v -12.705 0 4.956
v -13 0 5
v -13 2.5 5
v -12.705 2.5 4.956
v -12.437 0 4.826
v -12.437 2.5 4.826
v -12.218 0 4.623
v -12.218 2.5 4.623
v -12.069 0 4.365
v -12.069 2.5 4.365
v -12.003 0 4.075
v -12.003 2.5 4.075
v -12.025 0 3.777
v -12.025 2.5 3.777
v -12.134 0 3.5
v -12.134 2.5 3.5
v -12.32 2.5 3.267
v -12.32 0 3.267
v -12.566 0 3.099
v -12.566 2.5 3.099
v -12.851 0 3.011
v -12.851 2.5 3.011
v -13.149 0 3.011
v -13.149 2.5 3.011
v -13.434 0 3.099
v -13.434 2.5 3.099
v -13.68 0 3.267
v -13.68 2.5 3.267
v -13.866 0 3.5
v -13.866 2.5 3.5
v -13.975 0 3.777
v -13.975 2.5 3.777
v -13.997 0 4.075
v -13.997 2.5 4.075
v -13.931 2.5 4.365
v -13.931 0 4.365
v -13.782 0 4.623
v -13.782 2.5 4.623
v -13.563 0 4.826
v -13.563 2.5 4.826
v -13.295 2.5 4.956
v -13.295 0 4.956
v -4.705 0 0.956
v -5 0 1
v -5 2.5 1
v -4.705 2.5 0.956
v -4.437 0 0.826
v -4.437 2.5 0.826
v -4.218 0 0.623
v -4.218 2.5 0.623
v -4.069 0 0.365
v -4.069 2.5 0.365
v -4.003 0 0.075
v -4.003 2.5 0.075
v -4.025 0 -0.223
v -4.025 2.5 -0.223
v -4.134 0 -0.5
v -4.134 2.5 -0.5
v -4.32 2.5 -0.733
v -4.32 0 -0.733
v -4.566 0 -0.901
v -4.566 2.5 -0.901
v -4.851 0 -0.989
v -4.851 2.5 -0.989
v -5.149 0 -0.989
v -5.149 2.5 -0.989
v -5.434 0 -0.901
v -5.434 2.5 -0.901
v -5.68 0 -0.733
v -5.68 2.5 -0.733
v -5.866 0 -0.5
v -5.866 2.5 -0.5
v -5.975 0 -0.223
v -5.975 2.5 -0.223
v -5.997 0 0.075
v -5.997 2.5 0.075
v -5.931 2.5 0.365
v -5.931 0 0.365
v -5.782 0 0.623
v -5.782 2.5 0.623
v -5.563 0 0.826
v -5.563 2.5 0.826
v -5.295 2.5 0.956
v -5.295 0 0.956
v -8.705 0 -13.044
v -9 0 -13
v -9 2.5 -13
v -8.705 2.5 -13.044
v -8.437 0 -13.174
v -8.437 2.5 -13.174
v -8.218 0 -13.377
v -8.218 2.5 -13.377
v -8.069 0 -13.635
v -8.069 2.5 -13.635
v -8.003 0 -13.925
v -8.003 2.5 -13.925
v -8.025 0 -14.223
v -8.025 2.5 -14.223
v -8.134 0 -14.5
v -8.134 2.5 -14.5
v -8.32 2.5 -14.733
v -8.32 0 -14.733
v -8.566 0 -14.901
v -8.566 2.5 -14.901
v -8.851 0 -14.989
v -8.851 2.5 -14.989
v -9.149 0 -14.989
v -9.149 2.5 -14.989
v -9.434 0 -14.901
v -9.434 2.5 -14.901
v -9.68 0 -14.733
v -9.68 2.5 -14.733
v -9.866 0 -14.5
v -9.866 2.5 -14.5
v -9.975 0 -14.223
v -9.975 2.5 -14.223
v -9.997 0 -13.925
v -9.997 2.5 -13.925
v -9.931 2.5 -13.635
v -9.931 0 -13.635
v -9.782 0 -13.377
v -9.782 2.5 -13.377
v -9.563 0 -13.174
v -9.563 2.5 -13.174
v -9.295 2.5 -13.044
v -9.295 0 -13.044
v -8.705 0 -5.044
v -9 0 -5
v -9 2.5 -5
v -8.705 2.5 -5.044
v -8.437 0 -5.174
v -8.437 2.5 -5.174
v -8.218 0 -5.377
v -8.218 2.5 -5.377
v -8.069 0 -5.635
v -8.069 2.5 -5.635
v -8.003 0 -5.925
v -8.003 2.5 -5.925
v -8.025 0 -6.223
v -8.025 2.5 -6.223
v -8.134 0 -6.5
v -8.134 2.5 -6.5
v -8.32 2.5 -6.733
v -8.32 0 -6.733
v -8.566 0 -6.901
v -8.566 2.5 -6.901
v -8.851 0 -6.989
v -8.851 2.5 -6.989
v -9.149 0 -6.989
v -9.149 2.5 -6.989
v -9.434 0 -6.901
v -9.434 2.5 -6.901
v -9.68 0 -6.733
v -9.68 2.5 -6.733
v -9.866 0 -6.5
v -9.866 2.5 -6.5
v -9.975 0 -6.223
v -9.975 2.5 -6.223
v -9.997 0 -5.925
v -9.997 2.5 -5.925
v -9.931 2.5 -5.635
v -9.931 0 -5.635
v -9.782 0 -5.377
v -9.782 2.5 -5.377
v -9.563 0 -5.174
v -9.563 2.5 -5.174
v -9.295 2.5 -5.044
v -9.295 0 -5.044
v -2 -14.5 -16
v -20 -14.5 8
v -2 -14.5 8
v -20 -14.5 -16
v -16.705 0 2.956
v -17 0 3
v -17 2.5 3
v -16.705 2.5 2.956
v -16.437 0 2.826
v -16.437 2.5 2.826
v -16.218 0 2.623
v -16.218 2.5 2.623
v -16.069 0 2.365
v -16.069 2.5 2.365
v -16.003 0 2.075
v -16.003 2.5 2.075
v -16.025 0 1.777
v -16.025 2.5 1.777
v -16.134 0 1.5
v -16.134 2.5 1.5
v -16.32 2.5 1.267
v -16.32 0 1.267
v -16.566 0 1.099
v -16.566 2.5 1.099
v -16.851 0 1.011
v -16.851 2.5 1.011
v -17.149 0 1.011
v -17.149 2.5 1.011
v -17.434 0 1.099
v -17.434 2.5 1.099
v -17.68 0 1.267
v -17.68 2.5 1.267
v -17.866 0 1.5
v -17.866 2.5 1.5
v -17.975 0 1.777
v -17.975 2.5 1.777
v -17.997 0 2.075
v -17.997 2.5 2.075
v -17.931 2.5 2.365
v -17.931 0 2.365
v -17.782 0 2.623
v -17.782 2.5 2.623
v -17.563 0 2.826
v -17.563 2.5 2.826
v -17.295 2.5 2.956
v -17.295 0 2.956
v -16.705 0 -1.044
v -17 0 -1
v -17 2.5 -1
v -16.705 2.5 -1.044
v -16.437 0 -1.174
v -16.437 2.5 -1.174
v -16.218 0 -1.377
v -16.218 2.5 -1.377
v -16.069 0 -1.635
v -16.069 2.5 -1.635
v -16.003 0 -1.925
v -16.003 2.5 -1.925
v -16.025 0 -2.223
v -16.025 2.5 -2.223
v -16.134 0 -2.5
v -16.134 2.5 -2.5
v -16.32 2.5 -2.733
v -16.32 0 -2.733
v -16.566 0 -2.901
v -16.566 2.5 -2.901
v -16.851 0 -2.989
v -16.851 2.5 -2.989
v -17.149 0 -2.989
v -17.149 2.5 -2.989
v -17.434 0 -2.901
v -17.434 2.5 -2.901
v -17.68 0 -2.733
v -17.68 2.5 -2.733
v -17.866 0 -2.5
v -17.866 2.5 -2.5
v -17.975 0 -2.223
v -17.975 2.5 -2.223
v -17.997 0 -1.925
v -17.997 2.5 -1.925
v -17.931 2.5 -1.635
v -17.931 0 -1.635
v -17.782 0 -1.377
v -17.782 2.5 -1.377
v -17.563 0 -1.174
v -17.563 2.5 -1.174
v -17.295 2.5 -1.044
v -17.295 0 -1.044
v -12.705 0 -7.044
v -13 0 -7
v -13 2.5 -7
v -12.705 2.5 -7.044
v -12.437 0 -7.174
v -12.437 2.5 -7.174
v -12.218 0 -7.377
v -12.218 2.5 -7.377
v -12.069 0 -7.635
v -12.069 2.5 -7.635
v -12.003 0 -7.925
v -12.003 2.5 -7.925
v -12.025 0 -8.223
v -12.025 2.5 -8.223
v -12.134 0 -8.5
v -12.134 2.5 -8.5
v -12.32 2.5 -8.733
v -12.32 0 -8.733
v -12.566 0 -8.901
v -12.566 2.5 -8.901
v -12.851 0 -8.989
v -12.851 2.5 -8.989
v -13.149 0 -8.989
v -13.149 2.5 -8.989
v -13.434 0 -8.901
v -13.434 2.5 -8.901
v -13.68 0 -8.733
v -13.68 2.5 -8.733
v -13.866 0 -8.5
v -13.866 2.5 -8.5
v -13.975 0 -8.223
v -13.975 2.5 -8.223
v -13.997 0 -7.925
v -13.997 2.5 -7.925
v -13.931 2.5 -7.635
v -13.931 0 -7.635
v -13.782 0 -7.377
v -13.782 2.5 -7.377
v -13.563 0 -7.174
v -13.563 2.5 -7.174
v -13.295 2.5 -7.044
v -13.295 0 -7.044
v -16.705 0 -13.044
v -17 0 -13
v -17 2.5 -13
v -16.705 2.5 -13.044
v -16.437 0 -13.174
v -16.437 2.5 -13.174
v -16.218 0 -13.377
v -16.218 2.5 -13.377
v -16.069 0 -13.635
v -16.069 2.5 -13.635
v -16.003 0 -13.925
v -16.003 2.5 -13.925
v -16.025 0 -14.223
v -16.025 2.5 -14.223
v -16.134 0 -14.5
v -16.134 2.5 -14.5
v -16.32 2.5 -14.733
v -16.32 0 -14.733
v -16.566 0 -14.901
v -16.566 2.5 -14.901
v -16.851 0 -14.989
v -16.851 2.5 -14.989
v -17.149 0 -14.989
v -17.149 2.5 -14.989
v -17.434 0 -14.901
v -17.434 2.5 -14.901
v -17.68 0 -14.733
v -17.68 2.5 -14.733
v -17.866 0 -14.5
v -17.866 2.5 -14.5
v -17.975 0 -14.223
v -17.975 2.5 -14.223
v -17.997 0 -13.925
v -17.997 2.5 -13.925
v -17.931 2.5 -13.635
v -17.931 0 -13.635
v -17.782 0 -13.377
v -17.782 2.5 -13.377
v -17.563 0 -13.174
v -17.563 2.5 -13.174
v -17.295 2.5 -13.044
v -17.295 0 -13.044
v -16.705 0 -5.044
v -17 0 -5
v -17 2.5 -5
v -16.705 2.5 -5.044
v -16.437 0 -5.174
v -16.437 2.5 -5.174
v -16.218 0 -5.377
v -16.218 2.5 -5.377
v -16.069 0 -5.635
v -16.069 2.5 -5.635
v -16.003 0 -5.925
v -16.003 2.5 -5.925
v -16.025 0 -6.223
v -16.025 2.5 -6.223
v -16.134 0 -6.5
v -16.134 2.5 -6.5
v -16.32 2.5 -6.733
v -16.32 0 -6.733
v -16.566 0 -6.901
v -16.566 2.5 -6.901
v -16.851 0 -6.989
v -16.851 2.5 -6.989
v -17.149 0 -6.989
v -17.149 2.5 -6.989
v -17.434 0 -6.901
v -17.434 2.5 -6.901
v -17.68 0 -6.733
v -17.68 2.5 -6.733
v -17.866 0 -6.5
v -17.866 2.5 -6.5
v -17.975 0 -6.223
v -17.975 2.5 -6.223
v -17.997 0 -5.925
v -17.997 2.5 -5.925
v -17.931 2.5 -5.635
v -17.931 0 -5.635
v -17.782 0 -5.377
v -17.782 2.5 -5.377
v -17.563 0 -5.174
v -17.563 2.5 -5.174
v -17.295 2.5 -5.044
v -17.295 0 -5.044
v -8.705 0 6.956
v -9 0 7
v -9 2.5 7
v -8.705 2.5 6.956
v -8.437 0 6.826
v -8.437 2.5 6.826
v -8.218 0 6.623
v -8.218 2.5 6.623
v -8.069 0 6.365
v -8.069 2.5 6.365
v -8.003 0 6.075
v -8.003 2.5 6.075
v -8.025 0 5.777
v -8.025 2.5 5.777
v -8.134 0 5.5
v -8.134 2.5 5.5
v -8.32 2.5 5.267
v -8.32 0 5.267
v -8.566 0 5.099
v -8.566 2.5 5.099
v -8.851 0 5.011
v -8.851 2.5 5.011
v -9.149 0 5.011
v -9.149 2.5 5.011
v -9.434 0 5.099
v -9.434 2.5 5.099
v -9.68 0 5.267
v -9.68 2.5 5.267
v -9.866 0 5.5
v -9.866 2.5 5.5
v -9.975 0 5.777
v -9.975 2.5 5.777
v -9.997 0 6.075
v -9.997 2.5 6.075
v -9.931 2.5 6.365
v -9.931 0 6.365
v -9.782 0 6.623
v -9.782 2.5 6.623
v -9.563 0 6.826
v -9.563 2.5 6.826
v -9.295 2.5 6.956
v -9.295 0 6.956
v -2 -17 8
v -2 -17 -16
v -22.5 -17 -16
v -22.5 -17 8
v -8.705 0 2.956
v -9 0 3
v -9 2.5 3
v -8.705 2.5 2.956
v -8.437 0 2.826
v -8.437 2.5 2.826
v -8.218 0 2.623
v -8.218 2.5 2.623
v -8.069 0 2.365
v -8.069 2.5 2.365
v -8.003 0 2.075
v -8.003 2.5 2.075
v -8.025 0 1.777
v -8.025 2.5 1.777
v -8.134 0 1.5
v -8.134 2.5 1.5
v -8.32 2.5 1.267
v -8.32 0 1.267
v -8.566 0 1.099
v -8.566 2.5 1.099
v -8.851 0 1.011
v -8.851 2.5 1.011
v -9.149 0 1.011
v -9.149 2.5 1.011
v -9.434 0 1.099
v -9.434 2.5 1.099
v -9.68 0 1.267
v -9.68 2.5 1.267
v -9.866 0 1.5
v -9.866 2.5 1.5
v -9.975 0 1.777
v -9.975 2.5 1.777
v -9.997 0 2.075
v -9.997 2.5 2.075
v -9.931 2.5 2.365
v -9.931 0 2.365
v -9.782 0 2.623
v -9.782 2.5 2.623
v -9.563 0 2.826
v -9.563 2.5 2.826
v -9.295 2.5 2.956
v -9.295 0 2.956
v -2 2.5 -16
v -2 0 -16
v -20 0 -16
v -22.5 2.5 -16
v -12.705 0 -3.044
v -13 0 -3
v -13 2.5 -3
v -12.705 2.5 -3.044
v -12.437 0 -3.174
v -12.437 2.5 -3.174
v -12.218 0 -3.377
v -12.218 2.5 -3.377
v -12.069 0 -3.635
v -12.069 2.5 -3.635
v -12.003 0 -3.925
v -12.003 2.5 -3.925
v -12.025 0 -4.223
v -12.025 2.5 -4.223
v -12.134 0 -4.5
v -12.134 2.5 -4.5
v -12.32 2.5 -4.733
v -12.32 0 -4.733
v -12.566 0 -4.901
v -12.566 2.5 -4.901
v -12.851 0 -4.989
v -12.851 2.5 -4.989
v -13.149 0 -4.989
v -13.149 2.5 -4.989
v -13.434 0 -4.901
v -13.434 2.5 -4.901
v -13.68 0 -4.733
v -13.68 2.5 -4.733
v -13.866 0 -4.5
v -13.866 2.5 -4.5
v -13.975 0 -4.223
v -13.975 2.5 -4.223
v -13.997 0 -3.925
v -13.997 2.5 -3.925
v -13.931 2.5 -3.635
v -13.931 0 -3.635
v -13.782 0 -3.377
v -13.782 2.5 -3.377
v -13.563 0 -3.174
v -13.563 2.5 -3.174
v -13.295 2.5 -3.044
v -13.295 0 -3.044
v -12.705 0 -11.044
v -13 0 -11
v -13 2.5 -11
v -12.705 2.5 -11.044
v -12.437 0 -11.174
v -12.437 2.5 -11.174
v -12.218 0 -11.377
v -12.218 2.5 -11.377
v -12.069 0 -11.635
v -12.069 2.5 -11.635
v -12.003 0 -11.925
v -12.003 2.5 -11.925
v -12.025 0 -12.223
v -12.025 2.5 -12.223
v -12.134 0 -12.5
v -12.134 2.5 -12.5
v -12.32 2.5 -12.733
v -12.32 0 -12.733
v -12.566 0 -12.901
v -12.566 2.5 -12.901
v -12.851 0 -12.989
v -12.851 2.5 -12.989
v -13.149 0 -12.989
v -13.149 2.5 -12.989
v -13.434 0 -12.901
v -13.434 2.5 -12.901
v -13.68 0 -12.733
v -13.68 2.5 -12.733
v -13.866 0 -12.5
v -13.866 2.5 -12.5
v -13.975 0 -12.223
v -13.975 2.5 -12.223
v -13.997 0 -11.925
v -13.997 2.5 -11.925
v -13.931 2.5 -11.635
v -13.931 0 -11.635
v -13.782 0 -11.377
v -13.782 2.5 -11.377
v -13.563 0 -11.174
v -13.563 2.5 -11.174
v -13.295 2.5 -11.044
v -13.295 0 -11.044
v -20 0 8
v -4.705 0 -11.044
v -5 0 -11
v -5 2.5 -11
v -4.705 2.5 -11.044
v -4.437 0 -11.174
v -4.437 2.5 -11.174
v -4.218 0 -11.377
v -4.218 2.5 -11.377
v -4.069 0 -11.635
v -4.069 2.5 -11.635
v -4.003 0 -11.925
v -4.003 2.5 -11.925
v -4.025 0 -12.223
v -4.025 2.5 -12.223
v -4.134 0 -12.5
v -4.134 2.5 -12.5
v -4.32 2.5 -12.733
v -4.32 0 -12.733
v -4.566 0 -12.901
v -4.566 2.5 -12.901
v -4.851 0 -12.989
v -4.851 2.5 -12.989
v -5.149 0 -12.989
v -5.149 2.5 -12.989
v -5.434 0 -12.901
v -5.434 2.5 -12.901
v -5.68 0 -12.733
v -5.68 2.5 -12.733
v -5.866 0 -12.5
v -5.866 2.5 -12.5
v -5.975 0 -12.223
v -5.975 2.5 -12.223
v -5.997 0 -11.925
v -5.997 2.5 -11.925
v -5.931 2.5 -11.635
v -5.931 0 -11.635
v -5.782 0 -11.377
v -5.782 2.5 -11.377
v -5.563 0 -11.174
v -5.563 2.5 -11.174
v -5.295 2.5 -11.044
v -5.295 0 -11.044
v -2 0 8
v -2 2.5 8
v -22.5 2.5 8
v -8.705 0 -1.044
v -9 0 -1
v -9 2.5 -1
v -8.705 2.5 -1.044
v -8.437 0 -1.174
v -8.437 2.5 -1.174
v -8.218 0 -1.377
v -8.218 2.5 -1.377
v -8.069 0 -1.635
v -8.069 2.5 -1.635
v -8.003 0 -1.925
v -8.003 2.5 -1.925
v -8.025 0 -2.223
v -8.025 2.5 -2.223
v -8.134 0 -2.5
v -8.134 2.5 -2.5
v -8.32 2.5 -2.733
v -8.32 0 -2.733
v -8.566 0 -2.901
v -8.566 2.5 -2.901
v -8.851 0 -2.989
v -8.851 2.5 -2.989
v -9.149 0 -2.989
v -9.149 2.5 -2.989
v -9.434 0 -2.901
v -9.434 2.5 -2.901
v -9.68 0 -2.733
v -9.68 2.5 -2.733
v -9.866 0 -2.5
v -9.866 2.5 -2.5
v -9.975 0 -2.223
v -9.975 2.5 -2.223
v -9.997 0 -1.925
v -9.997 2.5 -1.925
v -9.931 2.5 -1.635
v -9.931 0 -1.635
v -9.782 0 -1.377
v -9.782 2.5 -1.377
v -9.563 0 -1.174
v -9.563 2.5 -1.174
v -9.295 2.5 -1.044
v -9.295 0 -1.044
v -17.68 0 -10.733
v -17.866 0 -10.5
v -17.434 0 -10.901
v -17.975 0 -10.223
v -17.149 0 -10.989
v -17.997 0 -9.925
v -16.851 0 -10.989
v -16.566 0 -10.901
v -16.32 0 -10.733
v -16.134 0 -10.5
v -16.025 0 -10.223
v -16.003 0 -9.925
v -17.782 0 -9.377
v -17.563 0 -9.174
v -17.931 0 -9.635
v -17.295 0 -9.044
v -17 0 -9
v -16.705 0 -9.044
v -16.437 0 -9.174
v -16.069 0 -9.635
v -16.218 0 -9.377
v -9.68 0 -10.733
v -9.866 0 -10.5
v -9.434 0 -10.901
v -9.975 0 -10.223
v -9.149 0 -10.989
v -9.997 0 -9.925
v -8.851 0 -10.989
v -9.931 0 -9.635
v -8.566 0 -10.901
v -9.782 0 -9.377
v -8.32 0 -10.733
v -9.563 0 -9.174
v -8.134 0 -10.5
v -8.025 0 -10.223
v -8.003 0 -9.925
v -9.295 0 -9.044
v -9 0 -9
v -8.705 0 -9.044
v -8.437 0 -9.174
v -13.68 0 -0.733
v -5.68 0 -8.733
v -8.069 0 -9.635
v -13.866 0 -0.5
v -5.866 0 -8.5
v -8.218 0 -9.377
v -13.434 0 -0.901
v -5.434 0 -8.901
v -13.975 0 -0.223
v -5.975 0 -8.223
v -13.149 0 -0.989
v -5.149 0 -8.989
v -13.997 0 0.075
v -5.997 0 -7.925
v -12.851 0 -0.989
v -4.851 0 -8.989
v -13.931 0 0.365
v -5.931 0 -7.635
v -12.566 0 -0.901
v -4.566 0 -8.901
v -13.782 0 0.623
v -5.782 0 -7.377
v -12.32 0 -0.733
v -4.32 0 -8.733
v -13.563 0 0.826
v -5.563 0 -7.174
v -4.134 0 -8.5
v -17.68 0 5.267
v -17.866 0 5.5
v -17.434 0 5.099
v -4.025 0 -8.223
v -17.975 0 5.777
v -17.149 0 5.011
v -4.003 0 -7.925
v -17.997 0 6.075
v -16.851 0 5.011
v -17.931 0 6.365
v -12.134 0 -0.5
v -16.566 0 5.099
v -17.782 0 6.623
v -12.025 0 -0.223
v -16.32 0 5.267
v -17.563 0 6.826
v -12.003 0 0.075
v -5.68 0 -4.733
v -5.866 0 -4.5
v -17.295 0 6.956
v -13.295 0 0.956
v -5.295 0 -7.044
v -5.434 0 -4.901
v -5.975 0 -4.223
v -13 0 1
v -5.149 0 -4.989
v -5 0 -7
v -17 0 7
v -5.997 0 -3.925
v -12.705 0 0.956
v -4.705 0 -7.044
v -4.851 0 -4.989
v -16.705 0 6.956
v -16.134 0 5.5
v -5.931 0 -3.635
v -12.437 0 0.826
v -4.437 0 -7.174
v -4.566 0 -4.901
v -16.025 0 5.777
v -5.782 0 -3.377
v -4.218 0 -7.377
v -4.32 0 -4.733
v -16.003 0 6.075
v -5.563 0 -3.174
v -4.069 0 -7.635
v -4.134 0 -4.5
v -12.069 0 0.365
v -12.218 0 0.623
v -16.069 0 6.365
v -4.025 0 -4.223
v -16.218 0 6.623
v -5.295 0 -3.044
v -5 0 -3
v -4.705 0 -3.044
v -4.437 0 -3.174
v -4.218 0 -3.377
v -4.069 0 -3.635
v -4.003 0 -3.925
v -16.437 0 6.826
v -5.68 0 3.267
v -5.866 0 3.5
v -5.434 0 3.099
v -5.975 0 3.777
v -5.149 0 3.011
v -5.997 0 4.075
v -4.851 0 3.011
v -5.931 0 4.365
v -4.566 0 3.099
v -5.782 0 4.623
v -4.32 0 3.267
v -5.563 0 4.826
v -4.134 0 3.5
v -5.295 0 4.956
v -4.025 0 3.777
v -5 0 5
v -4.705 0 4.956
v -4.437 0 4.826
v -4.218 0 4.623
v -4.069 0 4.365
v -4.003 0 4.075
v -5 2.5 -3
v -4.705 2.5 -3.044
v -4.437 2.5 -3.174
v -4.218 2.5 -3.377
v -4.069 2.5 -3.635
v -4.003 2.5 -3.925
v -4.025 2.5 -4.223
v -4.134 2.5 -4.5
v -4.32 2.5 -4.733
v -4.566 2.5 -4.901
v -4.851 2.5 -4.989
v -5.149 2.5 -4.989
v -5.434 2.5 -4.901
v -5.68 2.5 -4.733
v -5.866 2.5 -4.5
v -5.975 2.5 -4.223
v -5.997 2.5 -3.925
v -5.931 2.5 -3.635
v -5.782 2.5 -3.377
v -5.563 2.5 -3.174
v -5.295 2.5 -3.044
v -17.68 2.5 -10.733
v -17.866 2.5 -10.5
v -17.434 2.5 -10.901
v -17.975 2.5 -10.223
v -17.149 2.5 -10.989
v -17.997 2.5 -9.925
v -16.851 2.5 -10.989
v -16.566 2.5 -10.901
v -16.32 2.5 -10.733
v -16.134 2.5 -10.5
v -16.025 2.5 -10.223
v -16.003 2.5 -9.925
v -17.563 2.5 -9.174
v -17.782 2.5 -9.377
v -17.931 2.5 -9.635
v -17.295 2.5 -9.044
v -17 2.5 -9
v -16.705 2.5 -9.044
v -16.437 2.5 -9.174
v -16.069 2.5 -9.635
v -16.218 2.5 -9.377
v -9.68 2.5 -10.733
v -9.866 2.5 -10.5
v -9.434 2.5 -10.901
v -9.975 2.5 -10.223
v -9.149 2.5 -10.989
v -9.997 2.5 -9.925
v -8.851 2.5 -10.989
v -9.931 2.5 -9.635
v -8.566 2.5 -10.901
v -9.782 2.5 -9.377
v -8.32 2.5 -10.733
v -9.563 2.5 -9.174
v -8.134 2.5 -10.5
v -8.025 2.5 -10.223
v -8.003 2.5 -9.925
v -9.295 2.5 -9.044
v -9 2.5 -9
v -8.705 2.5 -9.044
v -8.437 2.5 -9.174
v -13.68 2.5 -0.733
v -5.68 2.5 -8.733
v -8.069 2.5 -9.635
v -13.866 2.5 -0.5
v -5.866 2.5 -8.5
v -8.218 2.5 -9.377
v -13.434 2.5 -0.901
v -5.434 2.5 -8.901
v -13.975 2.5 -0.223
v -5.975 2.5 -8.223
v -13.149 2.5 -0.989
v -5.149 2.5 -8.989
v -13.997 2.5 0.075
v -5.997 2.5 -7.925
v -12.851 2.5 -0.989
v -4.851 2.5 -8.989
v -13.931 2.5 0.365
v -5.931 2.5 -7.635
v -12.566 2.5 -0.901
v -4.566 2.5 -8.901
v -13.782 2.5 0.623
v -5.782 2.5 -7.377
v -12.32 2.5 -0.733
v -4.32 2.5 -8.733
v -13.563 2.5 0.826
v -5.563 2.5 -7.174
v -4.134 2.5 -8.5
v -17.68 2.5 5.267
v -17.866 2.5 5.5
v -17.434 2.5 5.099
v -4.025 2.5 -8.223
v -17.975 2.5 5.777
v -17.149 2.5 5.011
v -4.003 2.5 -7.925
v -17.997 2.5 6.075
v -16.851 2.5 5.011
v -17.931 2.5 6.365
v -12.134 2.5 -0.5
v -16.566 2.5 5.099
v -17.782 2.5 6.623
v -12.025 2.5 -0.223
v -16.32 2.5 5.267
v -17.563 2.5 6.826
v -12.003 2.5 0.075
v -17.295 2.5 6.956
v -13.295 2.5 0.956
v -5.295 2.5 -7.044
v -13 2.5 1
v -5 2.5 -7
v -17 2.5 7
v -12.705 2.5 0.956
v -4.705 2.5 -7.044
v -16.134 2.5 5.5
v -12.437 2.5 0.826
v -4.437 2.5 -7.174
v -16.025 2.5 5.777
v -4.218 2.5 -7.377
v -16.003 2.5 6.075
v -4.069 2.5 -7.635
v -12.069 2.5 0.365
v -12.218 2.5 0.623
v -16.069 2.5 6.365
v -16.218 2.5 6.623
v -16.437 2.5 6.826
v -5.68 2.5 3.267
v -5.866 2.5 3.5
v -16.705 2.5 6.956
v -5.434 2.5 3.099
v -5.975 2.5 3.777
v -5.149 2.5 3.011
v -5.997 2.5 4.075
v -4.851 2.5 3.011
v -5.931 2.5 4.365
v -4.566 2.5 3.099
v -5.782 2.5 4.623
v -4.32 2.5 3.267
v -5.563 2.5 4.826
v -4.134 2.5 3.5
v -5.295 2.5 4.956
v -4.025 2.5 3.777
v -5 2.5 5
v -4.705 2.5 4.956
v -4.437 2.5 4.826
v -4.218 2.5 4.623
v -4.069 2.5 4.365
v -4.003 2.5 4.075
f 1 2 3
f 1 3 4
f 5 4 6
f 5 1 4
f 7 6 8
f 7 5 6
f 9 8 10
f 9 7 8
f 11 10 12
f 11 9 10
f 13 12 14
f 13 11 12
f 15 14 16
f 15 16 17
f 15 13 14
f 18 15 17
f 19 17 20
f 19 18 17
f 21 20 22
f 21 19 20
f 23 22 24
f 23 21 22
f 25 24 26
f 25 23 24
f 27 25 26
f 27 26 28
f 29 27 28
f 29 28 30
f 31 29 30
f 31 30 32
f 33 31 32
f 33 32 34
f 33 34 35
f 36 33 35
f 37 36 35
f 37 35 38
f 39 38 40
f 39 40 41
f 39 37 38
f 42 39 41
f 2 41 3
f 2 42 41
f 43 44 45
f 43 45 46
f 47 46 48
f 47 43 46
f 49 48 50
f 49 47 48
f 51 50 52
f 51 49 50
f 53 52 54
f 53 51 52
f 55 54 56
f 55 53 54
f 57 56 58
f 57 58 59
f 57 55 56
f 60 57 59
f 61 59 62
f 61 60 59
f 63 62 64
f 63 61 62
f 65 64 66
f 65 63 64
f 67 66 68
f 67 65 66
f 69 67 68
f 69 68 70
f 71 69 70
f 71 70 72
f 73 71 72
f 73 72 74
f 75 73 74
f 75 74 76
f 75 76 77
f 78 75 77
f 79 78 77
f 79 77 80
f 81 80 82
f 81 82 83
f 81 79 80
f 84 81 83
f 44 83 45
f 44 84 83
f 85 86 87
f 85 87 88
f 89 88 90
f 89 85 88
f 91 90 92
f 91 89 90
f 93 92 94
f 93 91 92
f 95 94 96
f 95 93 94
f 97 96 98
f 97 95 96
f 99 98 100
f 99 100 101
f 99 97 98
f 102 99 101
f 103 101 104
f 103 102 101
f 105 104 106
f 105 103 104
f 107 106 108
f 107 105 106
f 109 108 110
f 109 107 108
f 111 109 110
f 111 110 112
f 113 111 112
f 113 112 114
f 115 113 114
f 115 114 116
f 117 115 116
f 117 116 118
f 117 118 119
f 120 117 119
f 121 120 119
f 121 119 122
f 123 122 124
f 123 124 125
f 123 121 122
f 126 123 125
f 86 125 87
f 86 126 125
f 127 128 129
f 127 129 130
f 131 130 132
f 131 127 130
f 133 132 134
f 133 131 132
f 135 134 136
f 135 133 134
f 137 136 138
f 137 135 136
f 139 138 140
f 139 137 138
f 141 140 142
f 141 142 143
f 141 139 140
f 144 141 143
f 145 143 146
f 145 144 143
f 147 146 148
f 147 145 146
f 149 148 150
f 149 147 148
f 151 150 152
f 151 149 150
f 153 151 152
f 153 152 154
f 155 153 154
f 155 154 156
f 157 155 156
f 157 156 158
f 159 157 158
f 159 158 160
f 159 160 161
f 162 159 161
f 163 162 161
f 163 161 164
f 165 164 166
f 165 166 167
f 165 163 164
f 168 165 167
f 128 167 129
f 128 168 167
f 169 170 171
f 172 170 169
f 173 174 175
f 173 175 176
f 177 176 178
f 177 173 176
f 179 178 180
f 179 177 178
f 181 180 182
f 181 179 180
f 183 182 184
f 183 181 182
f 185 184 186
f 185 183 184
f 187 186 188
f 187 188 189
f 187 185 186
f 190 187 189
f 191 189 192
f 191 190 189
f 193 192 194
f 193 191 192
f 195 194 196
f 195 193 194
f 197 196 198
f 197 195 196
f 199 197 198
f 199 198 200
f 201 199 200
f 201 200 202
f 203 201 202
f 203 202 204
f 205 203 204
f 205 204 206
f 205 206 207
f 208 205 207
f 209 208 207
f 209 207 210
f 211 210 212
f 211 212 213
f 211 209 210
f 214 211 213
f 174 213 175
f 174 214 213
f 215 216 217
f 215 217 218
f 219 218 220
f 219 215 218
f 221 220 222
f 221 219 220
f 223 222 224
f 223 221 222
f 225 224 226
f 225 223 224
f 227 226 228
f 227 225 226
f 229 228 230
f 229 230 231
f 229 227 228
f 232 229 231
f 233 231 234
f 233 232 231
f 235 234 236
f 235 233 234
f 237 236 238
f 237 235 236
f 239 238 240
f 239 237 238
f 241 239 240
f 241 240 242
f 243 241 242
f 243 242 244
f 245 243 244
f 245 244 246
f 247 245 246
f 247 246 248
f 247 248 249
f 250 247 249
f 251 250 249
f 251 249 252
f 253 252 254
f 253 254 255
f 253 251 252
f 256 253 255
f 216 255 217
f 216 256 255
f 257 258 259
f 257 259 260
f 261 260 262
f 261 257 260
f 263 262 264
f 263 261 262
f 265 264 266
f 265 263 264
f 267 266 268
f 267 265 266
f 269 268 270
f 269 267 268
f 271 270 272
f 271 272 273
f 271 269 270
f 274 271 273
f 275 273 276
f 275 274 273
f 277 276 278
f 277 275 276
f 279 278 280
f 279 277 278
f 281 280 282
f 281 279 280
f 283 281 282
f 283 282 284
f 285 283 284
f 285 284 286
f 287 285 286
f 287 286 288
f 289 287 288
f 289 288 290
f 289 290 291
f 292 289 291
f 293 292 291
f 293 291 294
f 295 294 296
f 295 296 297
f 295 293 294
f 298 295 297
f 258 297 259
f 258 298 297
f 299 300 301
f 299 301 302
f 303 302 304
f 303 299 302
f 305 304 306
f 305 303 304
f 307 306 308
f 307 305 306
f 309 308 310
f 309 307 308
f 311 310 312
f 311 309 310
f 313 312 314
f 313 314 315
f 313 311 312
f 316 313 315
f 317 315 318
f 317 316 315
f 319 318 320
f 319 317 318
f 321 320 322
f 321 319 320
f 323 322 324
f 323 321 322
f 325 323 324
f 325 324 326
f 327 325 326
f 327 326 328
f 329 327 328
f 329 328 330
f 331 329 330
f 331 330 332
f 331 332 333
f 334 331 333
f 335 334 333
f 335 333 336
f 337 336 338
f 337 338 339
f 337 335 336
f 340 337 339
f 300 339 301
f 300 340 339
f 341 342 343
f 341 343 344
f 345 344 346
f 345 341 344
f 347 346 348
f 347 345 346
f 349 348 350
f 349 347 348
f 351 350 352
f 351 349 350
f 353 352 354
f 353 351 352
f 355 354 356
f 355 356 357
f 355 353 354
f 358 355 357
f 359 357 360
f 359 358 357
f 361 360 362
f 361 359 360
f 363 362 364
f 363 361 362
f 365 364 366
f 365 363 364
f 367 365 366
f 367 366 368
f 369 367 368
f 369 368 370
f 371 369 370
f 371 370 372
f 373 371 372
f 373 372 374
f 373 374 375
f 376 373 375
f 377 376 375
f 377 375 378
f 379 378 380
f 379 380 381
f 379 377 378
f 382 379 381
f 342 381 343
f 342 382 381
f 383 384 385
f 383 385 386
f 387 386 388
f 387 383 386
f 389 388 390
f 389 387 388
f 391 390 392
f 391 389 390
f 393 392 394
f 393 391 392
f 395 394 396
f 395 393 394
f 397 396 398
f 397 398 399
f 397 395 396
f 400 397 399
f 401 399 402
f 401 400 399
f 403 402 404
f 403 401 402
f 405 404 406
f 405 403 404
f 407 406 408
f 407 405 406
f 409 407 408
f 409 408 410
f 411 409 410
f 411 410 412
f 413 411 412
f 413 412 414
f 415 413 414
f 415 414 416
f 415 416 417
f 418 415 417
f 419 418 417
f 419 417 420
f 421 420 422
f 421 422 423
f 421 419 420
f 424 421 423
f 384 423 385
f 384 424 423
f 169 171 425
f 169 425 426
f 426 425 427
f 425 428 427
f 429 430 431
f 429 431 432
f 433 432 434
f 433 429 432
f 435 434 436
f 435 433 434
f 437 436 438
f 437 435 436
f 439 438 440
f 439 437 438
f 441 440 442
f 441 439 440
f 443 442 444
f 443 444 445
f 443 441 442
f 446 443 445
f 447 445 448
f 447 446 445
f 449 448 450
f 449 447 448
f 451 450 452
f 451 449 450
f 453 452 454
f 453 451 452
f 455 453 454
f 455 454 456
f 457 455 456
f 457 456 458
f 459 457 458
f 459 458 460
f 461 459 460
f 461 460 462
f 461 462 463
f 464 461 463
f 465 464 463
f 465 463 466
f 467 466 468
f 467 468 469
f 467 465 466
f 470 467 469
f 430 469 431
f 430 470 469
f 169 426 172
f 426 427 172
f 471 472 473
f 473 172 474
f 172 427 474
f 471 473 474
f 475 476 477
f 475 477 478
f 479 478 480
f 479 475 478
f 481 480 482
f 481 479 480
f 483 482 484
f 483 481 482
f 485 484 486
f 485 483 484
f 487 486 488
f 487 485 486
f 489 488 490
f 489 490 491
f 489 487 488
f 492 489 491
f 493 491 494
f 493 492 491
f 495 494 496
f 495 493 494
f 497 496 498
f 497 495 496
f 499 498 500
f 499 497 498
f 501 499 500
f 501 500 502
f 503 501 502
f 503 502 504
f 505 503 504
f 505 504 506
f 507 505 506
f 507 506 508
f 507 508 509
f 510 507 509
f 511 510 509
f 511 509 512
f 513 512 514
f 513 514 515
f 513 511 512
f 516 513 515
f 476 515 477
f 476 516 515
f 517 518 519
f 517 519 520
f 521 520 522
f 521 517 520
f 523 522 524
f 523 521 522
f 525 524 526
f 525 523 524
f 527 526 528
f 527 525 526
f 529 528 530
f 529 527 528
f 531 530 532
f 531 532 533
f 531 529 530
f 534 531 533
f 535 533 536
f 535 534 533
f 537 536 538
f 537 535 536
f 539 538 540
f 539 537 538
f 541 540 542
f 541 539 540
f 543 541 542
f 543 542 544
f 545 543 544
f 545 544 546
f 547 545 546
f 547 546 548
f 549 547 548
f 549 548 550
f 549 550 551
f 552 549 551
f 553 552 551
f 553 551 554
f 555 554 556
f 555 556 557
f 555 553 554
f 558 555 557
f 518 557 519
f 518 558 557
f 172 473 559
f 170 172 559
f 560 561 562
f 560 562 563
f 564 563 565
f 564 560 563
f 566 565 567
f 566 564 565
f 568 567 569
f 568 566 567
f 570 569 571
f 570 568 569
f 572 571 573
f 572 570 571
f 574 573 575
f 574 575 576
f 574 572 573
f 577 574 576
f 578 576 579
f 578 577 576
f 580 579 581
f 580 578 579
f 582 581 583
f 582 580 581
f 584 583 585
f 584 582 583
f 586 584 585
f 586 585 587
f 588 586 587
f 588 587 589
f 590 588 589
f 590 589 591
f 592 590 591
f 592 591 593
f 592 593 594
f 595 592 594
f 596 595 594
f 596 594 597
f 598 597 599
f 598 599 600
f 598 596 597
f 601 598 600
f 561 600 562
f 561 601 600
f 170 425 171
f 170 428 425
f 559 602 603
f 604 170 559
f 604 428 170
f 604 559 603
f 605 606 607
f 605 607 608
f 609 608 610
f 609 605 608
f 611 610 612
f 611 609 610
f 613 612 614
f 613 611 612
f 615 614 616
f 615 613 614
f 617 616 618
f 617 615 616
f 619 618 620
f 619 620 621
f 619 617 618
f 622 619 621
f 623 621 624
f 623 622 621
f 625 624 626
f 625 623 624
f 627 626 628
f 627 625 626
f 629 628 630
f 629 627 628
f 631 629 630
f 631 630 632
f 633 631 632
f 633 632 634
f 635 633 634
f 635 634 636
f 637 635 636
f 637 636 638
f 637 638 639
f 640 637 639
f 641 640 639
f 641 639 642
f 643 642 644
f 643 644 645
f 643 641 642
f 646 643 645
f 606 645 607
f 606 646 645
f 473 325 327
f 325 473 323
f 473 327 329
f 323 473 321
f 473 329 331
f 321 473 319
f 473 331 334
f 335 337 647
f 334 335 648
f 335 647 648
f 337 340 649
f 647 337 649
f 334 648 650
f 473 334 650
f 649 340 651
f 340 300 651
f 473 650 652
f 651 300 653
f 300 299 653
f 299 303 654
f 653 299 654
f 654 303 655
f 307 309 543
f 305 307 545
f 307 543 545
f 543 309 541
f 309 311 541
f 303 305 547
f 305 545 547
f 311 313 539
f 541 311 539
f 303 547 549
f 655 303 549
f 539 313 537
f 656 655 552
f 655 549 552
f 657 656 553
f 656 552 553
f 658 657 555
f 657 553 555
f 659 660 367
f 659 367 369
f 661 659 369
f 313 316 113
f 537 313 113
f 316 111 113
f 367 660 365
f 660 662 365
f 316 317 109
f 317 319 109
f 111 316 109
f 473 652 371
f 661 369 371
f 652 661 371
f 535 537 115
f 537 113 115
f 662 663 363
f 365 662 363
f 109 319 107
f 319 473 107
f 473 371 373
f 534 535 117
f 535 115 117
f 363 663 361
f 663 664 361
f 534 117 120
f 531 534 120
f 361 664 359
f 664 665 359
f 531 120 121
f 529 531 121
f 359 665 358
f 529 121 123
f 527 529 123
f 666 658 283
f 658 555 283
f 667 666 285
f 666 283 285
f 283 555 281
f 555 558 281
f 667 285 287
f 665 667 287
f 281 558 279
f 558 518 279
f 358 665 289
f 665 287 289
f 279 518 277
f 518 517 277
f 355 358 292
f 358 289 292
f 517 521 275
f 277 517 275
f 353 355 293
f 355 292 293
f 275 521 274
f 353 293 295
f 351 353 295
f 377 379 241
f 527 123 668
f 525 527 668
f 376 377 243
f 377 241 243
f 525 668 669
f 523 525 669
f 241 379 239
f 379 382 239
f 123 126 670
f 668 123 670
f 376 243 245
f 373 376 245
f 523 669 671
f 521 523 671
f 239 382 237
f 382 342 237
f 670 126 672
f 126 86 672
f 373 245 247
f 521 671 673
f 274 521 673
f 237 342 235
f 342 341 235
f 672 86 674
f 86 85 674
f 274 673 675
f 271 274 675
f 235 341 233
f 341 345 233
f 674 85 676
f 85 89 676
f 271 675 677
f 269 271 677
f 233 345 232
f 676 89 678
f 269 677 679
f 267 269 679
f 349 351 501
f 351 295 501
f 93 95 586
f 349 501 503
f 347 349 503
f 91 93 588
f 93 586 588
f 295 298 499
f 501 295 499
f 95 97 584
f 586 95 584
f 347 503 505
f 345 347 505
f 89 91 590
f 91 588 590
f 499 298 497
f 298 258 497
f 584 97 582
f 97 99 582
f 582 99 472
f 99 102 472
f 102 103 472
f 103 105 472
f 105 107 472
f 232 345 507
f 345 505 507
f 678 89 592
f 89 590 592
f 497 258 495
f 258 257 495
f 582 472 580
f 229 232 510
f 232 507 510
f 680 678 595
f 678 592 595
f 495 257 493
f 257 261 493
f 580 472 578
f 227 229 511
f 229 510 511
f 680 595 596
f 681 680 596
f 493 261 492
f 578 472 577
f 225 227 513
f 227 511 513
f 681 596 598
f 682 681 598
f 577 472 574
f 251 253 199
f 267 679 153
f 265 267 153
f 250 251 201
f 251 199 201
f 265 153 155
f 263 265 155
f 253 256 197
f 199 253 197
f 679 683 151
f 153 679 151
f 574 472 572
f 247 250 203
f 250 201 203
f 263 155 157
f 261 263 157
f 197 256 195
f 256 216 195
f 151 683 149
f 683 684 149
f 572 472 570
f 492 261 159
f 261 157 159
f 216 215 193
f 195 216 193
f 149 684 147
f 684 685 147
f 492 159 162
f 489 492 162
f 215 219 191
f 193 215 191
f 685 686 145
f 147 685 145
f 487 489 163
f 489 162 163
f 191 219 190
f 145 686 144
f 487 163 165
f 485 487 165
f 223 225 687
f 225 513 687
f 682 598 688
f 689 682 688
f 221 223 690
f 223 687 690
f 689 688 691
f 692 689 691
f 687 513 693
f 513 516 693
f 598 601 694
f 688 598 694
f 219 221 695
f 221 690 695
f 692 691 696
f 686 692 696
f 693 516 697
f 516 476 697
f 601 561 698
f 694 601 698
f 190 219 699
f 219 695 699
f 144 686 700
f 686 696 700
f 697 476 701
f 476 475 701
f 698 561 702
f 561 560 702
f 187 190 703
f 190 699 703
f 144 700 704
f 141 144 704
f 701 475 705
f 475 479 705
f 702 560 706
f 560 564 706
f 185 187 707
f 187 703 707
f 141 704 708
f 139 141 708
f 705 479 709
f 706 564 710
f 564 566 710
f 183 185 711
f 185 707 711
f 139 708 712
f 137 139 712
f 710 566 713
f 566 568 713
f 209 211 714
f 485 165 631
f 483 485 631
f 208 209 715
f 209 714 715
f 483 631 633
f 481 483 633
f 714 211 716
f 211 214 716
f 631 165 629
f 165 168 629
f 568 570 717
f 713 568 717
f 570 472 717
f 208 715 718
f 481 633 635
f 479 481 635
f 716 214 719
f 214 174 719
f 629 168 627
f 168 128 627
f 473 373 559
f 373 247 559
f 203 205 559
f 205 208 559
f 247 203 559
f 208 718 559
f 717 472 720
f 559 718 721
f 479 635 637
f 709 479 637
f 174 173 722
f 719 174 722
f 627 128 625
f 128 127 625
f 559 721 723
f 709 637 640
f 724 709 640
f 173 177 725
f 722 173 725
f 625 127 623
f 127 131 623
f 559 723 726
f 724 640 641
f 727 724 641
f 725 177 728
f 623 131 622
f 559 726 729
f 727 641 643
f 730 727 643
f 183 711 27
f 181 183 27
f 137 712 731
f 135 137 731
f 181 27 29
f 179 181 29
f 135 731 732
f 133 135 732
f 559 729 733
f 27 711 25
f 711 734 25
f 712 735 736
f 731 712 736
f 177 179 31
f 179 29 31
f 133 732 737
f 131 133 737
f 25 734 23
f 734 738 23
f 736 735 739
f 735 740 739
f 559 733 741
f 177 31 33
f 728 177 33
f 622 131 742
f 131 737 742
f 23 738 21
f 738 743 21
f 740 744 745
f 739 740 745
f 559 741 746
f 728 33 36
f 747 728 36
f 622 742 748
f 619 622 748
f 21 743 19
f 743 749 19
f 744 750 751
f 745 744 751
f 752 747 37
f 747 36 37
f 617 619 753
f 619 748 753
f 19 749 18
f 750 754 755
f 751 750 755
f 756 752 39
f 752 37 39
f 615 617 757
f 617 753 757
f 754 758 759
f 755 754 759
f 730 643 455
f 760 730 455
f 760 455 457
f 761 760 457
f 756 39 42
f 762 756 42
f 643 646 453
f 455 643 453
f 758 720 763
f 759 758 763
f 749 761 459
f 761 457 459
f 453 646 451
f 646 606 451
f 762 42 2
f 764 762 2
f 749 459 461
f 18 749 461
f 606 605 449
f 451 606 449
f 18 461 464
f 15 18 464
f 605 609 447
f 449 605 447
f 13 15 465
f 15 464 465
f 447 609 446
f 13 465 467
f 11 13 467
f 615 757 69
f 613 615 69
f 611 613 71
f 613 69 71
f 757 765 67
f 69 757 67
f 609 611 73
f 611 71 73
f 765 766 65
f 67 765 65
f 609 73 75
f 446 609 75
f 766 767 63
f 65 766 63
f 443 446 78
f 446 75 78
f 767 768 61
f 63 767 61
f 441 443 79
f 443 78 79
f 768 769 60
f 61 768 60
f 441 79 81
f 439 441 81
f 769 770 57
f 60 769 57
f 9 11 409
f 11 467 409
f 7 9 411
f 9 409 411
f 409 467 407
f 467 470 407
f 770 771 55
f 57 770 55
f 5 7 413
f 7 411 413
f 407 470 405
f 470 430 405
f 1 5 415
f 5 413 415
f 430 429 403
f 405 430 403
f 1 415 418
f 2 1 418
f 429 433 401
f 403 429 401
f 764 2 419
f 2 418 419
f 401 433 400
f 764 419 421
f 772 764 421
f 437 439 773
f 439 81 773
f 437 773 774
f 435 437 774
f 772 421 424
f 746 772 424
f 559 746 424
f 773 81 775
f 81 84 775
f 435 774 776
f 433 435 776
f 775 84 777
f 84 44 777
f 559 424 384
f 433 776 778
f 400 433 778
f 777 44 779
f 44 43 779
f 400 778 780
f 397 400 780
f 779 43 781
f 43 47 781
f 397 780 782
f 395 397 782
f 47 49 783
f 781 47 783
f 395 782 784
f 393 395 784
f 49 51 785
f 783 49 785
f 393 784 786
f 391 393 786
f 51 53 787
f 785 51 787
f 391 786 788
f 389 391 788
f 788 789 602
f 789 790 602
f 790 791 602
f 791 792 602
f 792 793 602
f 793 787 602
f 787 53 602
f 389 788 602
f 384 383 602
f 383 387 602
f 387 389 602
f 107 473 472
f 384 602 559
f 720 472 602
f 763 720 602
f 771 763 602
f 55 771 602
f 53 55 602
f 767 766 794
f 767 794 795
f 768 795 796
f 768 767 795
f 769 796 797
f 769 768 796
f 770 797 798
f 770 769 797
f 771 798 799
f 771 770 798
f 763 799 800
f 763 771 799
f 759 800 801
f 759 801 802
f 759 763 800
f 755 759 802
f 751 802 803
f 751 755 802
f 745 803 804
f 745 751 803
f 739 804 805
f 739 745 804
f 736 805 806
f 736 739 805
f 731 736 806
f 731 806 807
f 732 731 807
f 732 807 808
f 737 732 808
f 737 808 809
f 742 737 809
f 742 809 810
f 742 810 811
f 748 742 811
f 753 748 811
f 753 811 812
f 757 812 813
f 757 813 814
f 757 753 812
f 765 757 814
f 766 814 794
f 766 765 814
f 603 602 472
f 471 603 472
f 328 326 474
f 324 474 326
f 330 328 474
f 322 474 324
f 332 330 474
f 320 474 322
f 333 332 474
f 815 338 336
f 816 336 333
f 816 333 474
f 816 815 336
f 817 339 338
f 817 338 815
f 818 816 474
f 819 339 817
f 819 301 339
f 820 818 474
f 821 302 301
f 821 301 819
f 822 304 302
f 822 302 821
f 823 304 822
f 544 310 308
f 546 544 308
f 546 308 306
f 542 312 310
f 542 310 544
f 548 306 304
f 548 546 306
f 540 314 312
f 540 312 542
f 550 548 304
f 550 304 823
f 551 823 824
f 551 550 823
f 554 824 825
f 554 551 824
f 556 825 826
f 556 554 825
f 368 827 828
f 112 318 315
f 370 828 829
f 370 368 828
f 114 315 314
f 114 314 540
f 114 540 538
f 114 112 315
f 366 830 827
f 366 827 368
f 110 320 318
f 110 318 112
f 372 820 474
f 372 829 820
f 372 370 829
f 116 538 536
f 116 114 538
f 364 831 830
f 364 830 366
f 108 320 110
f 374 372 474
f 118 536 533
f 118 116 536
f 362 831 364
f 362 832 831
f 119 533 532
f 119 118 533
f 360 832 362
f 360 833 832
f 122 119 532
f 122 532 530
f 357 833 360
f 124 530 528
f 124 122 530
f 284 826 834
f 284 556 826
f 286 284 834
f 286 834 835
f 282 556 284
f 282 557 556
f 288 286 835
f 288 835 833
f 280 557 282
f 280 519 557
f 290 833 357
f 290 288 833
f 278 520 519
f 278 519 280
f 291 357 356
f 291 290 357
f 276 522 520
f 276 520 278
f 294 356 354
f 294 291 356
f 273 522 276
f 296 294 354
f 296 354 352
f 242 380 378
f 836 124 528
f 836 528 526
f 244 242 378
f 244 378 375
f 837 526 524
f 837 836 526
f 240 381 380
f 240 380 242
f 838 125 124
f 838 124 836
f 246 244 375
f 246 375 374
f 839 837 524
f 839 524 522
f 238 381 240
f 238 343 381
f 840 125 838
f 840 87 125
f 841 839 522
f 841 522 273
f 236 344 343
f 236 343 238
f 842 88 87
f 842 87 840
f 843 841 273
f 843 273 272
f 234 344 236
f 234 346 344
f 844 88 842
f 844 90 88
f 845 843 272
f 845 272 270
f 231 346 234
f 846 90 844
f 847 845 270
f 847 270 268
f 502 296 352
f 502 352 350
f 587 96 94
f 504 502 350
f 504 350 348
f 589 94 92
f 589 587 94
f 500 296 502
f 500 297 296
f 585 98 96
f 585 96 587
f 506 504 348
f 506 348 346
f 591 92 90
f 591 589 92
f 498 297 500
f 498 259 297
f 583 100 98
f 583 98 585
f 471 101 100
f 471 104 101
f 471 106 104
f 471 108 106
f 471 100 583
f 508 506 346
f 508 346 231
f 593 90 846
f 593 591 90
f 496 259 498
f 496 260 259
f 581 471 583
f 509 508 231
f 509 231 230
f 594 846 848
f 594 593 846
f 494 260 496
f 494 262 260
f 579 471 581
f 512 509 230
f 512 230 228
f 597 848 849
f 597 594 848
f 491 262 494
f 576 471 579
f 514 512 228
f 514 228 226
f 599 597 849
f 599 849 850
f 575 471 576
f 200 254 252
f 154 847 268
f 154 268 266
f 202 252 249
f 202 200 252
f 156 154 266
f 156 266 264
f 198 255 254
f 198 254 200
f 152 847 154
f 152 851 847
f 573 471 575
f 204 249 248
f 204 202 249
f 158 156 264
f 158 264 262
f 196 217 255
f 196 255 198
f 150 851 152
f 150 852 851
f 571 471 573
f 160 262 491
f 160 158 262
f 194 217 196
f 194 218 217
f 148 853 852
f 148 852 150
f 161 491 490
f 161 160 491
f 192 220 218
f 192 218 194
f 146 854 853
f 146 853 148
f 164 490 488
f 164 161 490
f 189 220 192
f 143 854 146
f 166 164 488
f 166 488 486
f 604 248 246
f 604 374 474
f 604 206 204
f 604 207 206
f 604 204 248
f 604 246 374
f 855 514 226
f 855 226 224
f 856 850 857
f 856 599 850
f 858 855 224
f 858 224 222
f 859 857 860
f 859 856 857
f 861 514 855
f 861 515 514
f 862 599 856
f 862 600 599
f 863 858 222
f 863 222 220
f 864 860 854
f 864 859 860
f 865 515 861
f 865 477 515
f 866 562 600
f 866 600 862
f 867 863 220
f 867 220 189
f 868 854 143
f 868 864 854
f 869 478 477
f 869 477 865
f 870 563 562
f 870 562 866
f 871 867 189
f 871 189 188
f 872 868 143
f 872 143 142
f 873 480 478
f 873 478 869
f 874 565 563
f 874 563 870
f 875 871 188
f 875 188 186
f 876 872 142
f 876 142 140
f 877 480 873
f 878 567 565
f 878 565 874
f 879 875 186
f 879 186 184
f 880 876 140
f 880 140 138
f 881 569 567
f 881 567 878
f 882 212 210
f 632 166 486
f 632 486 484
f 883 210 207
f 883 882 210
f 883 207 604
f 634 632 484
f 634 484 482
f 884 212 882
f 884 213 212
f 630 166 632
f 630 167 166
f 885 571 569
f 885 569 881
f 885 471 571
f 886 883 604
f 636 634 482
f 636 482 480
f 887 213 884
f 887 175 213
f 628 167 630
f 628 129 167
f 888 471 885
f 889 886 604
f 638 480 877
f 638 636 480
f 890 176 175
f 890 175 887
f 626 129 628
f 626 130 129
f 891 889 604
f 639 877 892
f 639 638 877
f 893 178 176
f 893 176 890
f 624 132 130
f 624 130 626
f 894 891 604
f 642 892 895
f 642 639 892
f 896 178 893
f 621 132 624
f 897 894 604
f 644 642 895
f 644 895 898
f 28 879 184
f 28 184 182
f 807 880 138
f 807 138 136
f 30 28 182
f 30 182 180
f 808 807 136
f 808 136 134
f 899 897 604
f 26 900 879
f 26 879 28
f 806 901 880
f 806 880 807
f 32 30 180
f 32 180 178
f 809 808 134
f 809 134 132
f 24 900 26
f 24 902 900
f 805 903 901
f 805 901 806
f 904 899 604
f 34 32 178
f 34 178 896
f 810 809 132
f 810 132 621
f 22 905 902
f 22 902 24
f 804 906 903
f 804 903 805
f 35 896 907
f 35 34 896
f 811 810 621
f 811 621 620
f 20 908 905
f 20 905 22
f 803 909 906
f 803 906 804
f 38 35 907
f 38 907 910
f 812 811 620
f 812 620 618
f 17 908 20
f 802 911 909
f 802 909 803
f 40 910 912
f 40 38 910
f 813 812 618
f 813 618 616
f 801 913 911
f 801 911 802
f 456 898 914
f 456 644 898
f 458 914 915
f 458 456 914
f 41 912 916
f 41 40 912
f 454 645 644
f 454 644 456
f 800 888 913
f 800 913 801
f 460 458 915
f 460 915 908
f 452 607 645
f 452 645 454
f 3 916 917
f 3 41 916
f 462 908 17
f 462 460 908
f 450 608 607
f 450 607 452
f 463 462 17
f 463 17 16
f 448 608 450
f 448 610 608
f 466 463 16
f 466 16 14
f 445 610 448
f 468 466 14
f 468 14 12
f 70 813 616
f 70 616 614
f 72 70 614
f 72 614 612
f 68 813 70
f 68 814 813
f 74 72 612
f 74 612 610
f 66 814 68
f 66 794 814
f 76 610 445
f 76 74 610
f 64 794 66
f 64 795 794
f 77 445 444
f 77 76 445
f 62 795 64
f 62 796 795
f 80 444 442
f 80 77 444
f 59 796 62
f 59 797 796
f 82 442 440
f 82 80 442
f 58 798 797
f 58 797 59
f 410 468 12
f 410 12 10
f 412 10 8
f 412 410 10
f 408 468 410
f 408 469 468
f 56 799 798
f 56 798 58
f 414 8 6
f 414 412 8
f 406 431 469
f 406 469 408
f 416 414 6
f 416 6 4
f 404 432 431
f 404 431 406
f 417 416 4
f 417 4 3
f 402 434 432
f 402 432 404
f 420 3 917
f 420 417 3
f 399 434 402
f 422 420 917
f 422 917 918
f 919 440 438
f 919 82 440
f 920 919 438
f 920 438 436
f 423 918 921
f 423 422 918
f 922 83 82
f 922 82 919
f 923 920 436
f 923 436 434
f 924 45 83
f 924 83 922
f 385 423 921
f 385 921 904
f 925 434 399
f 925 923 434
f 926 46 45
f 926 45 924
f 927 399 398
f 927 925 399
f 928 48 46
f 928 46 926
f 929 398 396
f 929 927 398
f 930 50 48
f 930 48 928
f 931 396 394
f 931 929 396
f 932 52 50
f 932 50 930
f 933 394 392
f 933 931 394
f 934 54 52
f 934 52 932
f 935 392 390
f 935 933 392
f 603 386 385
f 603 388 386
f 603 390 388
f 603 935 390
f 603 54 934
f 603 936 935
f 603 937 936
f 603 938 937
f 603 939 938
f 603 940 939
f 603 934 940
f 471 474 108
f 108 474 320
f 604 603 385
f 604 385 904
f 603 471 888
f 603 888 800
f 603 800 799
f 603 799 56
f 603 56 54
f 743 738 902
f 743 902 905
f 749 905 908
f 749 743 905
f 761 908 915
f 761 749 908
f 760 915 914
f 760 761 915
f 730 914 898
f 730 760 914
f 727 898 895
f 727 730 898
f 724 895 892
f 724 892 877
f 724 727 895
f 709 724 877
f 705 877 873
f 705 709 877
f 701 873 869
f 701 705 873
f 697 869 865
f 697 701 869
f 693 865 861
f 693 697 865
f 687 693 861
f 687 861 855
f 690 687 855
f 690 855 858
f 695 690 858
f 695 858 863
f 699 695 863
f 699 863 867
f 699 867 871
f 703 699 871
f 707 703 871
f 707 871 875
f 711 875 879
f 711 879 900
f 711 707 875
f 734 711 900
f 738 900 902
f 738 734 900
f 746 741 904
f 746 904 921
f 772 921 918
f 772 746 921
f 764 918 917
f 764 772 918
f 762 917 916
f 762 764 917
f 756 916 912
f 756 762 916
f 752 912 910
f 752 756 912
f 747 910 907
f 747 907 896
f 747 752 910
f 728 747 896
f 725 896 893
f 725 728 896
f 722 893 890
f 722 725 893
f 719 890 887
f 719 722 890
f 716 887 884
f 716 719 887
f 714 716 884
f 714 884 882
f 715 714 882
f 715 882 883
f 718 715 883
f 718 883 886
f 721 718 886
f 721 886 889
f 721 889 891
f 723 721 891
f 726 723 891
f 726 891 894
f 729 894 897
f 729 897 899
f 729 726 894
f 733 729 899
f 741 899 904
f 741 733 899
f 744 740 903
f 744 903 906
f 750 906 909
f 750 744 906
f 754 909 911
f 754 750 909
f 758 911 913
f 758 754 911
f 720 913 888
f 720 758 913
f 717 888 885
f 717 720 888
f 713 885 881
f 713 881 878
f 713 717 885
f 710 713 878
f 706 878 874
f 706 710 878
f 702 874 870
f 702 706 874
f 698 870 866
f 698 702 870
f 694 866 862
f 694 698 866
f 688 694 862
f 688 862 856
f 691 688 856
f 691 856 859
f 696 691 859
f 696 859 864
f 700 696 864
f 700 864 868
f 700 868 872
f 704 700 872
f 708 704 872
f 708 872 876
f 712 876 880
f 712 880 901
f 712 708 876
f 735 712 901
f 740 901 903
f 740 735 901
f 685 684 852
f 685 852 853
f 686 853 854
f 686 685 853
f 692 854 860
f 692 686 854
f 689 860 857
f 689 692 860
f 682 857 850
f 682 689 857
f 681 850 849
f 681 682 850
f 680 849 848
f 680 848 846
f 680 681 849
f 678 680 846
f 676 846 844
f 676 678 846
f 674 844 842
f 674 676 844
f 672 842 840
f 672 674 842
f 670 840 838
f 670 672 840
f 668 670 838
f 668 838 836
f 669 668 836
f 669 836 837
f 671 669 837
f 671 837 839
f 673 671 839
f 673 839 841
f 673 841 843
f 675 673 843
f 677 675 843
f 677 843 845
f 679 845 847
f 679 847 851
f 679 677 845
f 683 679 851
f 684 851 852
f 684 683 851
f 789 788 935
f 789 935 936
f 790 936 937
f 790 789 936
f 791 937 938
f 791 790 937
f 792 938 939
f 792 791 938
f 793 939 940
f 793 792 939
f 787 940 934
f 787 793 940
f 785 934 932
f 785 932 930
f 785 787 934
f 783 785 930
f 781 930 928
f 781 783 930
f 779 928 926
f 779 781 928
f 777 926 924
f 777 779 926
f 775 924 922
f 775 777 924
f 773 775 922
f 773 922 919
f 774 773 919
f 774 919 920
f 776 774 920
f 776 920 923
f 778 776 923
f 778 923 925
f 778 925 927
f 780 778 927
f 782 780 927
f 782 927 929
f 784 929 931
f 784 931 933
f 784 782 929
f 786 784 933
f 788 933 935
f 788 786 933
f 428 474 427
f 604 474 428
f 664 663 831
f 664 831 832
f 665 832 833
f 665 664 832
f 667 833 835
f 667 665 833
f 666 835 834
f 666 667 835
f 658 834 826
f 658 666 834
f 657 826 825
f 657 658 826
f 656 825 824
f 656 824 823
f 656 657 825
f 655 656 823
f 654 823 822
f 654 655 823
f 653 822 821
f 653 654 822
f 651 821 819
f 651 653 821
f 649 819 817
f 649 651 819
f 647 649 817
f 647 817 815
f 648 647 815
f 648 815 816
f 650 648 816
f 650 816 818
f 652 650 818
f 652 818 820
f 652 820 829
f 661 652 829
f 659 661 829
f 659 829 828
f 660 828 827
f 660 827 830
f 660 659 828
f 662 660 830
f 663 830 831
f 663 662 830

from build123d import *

# Parameters (mm, degrees)
SKETCH2_W           = 18
SKETCH2_H           = 24
SKETCH2_R           = 1
BOSS_EXTRUDE2_DEPTH = 2.5
SKETCH4_W           = 24
SKETCH4_H           = 2.5
BOSS_EXTRUDE3_DEPTH = 2.5
SKETCH6_W           = 2.5
SKETCH6_H           = 24
BOSS_EXTRUDE5_DEPTH = 17
SKETCH7_W           = 24
SKETCH7_H           = 2.5
BOSS_EXTRUDE6_DEPTH = 18


with BuildPart() as part:
    # Sketch2 → Boss-Extrude2 (new body)
    with BuildSketch(Plane(origin=(0, 0, 0), x_dir=(1, 0, 0), z_dir=(0, 1, 0))):
        with Locations((-11, 4)):
            Rectangle(SKETCH2_W, SKETCH2_H)
        with Locations(Location((-17, -6, 0), (0, 0, 270))):
            Circle(SKETCH2_R, mode=Mode.SUBTRACT)
        with Locations(Location((-17, -2, 0), (0, 0, 270))):
            Circle(SKETCH2_R, mode=Mode.SUBTRACT)
        with Locations(Location((-17, 2, 0), (0, 0, 270))):
            Circle(SKETCH2_R, mode=Mode.SUBTRACT)
        with Locations(Location((-17, 6, 0), (0, 0, 270))):
            Circle(SKETCH2_R, mode=Mode.SUBTRACT)
        with Locations(Location((-17, 10, 0), (0, 0, 270))):
            Circle(SKETCH2_R, mode=Mode.SUBTRACT)
        with Locations(Location((-17, 14, 0), (0, 0, 270))):
            Circle(SKETCH2_R, mode=Mode.SUBTRACT)
        with Locations(Location((-13, -4, 0), (0, 0, 270))):
            Circle(SKETCH2_R, mode=Mode.SUBTRACT)
        with Locations(Location((-13, 0, 0), (0, 0, 270))):
            Circle(SKETCH2_R, mode=Mode.SUBTRACT)
        with Locations(Location((-13, 4, 0), (0, 0, 270))):
            Circle(SKETCH2_R, mode=Mode.SUBTRACT)
        with Locations(Location((-13, 8, 0), (0, 0, 270))):
            Circle(SKETCH2_R, mode=Mode.SUBTRACT)
        with Locations(Location((-13, 12, 0), (0, 0, 270))):
            Circle(SKETCH2_R, mode=Mode.SUBTRACT)
        with Locations(Location((-9, -6, 0), (0, 0, 270))):
            Circle(SKETCH2_R, mode=Mode.SUBTRACT)
        with Locations(Location((-9, -2, 0), (0, 0, 270))):
            Circle(SKETCH2_R, mode=Mode.SUBTRACT)
        with Locations(Location((-9, 2, 0), (0, 0, 270))):
            Circle(SKETCH2_R, mode=Mode.SUBTRACT)
        with Locations(Location((-9, 6, 0), (0, 0, 270))):
            Circle(SKETCH2_R, mode=Mode.SUBTRACT)
        with Locations(Location((-9, 10, 0), (0, 0, 270))):
            Circle(SKETCH2_R, mode=Mode.SUBTRACT)
        with Locations(Location((-9, 14, 0), (0, 0, 270))):
            Circle(SKETCH2_R, mode=Mode.SUBTRACT)
        with Locations(Location((-5, -4, 0), (0, 0, 270))):
            Circle(SKETCH2_R, mode=Mode.SUBTRACT)
        with Locations(Location((-5, 0, 0), (0, 0, 270))):
            Circle(SKETCH2_R, mode=Mode.SUBTRACT)
        with Locations(Location((-5, 4, 0), (0, 0, 270))):
            Circle(SKETCH2_R, mode=Mode.SUBTRACT)
        with Locations(Location((-5, 8, 0), (0, 0, 270))):
            Circle(SKETCH2_R, mode=Mode.SUBTRACT)
        with Locations(Location((-5, 12, 0), (0, 0, 270))):
            Circle(SKETCH2_R, mode=Mode.SUBTRACT)
    extrude(amount=BOSS_EXTRUDE2_DEPTH)

    # Sketch4 → Boss-Extrude3 (add)
    with BuildSketch(Plane.ZY.offset(20)):
        with Locations((-4, 1.25)):
            Rectangle(SKETCH4_W, SKETCH4_H)
    extrude(amount=BOSS_EXTRUDE3_DEPTH)

    # Sketch6 → Boss-Extrude5 (add)
    with BuildSketch(Plane.XZ):
        with Locations((-21.25, -4)):
            Rectangle(SKETCH6_W, SKETCH6_H)
    extrude(amount=BOSS_EXTRUDE5_DEPTH)

    # Sketch7 → Boss-Extrude6 (add)
    with BuildSketch(Plane(origin=(-20, 0, 0), x_dir=(0, 0, -1), z_dir=(1, 0, 0))):
        with Locations((4, -15.75)):
            Rectangle(SKETCH7_W, SKETCH7_H)
    extrude(amount=BOSS_EXTRUDE6_DEPTH)


solid = part.part
